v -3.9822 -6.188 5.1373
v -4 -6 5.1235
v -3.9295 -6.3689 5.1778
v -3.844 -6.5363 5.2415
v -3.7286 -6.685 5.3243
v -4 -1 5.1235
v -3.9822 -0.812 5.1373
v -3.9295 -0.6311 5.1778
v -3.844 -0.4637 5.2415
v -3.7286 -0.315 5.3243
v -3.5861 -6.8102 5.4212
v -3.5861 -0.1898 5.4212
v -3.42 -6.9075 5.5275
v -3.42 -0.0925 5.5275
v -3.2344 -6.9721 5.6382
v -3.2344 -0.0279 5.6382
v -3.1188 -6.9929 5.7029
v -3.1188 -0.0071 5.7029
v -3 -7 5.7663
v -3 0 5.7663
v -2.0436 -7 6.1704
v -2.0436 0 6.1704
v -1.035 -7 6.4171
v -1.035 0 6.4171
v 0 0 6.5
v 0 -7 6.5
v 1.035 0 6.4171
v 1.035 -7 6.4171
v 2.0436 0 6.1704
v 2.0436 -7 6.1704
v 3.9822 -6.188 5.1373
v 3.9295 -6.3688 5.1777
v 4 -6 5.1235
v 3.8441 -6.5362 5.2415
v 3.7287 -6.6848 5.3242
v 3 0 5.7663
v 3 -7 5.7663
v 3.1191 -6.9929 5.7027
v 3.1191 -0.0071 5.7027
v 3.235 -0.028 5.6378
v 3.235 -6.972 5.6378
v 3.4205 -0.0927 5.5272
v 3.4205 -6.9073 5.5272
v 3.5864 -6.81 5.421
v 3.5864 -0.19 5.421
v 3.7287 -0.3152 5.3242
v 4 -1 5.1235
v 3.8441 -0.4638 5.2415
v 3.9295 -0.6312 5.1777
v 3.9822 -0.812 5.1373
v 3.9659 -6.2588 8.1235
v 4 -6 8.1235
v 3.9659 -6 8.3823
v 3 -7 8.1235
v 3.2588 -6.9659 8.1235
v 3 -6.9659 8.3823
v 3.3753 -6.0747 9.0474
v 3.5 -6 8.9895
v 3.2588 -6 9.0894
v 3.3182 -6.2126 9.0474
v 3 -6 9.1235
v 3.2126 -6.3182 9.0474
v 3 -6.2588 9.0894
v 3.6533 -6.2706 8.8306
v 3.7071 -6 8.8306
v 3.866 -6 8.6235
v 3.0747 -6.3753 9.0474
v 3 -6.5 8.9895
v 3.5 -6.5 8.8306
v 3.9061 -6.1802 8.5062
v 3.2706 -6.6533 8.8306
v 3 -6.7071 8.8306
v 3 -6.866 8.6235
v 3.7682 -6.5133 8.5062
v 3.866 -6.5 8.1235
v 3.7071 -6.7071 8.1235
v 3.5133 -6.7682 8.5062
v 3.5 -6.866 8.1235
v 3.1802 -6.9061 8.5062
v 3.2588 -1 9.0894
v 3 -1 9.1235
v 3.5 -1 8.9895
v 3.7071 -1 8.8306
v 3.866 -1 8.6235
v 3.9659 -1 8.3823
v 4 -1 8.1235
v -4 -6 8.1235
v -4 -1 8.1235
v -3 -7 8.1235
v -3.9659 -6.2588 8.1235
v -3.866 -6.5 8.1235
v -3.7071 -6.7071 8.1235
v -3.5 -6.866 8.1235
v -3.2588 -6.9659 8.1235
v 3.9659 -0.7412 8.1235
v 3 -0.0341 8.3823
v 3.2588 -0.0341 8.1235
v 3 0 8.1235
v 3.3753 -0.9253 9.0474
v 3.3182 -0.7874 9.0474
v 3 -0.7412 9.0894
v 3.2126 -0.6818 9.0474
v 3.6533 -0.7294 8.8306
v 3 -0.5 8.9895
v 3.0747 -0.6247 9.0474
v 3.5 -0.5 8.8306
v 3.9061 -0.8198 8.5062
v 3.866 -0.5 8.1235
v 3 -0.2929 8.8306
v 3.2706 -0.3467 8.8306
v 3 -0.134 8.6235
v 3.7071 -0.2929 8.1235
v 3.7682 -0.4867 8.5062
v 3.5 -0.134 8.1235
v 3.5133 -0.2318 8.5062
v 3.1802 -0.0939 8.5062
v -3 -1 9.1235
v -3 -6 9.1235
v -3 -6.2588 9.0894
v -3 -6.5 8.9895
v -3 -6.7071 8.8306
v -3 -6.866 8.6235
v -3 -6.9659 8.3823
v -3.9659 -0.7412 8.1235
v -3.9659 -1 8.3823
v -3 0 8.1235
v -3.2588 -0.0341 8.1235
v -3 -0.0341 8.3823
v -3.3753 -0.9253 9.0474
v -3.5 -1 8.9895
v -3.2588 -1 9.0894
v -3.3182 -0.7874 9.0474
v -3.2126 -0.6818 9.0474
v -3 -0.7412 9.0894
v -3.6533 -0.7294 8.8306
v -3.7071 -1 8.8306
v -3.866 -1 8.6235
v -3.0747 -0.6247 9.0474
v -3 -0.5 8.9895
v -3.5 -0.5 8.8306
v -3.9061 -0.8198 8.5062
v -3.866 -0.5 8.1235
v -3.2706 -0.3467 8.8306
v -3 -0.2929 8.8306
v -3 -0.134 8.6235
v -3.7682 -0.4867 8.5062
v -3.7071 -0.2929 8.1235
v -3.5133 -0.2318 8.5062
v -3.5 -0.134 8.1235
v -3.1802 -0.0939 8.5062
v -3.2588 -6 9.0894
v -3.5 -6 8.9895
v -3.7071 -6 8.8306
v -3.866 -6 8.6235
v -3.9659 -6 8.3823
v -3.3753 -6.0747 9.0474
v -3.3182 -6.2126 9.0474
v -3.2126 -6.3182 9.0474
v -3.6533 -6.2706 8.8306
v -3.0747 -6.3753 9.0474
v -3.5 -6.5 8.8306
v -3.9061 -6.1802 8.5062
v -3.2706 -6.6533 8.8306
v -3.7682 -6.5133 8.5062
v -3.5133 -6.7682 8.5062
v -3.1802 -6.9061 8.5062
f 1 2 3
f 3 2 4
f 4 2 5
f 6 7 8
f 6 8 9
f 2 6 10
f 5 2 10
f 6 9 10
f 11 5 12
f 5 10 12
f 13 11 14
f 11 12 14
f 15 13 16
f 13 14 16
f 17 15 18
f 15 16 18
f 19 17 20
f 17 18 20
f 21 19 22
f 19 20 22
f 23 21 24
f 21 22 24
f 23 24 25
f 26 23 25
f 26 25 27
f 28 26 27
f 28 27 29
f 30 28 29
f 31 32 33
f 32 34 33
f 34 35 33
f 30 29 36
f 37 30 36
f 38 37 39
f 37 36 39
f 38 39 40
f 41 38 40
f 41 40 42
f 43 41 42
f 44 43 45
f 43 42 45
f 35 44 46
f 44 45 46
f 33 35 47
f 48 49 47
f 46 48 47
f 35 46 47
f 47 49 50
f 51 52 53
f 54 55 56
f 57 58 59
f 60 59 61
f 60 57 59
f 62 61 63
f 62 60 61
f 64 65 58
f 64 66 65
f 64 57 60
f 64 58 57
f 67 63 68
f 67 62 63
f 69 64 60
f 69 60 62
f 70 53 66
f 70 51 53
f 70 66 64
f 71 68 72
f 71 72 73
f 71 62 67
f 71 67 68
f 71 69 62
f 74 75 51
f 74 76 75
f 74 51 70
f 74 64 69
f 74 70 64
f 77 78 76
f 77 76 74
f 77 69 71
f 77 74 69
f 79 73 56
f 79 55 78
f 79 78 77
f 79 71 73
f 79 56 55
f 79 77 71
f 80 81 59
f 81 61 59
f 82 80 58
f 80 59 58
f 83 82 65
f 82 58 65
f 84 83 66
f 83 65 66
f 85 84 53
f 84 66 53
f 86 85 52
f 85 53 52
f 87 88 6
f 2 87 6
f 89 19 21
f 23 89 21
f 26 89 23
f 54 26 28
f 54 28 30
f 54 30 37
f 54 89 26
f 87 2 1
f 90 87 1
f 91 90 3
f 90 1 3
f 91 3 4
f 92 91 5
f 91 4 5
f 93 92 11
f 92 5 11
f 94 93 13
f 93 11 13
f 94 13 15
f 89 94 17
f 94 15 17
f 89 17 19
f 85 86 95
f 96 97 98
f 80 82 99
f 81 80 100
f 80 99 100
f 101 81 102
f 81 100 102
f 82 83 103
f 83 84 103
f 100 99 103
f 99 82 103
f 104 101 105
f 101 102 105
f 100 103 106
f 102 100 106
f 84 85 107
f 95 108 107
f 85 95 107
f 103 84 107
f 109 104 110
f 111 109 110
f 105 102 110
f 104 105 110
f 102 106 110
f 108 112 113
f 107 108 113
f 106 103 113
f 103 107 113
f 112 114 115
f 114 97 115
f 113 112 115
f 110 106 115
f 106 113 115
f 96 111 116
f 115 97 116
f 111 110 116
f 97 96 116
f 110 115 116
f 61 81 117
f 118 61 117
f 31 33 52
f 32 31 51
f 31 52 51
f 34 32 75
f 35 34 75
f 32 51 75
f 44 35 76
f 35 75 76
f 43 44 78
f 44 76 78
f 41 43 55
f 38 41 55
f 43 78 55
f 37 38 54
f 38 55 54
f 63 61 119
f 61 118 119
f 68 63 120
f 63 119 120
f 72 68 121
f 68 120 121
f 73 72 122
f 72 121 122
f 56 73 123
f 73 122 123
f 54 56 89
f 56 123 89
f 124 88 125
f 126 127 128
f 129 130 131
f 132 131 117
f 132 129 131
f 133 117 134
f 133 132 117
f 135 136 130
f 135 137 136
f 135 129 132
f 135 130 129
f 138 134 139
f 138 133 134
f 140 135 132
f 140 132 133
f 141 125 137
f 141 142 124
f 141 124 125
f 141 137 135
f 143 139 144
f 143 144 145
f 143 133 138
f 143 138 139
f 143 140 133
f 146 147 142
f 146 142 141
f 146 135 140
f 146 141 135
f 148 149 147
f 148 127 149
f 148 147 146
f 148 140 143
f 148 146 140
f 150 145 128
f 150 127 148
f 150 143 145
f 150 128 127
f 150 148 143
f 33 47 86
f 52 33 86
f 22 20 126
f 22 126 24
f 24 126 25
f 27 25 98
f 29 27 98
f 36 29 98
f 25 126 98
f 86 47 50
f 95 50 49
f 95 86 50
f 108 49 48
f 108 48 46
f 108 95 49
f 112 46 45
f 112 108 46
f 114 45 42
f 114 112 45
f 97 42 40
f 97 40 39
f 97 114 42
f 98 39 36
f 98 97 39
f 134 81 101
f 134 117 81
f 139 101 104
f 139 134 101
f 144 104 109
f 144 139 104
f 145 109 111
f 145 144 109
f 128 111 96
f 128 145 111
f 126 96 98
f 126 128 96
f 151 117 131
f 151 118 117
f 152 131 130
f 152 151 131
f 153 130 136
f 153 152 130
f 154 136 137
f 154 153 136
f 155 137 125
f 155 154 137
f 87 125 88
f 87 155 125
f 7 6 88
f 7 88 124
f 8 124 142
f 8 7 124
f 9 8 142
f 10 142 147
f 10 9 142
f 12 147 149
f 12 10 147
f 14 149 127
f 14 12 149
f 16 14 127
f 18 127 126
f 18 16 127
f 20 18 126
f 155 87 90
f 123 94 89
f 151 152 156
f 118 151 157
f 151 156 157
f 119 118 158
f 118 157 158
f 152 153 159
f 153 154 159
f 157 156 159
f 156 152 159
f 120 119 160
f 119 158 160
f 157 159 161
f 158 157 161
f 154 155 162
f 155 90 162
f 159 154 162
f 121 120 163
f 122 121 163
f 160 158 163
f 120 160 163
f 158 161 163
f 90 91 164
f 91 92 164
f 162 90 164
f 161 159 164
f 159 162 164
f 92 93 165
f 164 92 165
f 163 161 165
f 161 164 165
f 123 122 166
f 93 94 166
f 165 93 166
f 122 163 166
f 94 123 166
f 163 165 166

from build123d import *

# Parameters (mm, degrees)
F1_DEPTH = 7
F2_R     = 1


with BuildPart() as f1:
    # F0 (on Front) → F1 (new body)
    with BuildSketch(Plane.XZ):
        with BuildLine():
            Line((4, 9.123475), (-4, 9.123475))
            Line((-4, 9.123475), (-4, 5.123475))
            ThreePointArc((-4, 5.123475), (0, 6.5), (4, 5.123475))
            Line((4, 5.123475), (4, 9.123475))
        make_face()
    extrude(amount=F1_DEPTH)

    # F2
    f2_edges = [f1.edges().sort_by_distance(p)[0] for p in [
        (-4, -7, 7.123475),
        (4, -7, 7.123475),
        (4, 0, 7.123475),
        (-4, 0, 7.123475),
        (4, -3.5, 9.123475),
        (-4, -3.5, 9.123475),
        (0, 0, 9.123475),
        (0, -7, 9.123475),
    ]]
    fillet(f2_edges, radius=F2_R)


solid = f1.part
